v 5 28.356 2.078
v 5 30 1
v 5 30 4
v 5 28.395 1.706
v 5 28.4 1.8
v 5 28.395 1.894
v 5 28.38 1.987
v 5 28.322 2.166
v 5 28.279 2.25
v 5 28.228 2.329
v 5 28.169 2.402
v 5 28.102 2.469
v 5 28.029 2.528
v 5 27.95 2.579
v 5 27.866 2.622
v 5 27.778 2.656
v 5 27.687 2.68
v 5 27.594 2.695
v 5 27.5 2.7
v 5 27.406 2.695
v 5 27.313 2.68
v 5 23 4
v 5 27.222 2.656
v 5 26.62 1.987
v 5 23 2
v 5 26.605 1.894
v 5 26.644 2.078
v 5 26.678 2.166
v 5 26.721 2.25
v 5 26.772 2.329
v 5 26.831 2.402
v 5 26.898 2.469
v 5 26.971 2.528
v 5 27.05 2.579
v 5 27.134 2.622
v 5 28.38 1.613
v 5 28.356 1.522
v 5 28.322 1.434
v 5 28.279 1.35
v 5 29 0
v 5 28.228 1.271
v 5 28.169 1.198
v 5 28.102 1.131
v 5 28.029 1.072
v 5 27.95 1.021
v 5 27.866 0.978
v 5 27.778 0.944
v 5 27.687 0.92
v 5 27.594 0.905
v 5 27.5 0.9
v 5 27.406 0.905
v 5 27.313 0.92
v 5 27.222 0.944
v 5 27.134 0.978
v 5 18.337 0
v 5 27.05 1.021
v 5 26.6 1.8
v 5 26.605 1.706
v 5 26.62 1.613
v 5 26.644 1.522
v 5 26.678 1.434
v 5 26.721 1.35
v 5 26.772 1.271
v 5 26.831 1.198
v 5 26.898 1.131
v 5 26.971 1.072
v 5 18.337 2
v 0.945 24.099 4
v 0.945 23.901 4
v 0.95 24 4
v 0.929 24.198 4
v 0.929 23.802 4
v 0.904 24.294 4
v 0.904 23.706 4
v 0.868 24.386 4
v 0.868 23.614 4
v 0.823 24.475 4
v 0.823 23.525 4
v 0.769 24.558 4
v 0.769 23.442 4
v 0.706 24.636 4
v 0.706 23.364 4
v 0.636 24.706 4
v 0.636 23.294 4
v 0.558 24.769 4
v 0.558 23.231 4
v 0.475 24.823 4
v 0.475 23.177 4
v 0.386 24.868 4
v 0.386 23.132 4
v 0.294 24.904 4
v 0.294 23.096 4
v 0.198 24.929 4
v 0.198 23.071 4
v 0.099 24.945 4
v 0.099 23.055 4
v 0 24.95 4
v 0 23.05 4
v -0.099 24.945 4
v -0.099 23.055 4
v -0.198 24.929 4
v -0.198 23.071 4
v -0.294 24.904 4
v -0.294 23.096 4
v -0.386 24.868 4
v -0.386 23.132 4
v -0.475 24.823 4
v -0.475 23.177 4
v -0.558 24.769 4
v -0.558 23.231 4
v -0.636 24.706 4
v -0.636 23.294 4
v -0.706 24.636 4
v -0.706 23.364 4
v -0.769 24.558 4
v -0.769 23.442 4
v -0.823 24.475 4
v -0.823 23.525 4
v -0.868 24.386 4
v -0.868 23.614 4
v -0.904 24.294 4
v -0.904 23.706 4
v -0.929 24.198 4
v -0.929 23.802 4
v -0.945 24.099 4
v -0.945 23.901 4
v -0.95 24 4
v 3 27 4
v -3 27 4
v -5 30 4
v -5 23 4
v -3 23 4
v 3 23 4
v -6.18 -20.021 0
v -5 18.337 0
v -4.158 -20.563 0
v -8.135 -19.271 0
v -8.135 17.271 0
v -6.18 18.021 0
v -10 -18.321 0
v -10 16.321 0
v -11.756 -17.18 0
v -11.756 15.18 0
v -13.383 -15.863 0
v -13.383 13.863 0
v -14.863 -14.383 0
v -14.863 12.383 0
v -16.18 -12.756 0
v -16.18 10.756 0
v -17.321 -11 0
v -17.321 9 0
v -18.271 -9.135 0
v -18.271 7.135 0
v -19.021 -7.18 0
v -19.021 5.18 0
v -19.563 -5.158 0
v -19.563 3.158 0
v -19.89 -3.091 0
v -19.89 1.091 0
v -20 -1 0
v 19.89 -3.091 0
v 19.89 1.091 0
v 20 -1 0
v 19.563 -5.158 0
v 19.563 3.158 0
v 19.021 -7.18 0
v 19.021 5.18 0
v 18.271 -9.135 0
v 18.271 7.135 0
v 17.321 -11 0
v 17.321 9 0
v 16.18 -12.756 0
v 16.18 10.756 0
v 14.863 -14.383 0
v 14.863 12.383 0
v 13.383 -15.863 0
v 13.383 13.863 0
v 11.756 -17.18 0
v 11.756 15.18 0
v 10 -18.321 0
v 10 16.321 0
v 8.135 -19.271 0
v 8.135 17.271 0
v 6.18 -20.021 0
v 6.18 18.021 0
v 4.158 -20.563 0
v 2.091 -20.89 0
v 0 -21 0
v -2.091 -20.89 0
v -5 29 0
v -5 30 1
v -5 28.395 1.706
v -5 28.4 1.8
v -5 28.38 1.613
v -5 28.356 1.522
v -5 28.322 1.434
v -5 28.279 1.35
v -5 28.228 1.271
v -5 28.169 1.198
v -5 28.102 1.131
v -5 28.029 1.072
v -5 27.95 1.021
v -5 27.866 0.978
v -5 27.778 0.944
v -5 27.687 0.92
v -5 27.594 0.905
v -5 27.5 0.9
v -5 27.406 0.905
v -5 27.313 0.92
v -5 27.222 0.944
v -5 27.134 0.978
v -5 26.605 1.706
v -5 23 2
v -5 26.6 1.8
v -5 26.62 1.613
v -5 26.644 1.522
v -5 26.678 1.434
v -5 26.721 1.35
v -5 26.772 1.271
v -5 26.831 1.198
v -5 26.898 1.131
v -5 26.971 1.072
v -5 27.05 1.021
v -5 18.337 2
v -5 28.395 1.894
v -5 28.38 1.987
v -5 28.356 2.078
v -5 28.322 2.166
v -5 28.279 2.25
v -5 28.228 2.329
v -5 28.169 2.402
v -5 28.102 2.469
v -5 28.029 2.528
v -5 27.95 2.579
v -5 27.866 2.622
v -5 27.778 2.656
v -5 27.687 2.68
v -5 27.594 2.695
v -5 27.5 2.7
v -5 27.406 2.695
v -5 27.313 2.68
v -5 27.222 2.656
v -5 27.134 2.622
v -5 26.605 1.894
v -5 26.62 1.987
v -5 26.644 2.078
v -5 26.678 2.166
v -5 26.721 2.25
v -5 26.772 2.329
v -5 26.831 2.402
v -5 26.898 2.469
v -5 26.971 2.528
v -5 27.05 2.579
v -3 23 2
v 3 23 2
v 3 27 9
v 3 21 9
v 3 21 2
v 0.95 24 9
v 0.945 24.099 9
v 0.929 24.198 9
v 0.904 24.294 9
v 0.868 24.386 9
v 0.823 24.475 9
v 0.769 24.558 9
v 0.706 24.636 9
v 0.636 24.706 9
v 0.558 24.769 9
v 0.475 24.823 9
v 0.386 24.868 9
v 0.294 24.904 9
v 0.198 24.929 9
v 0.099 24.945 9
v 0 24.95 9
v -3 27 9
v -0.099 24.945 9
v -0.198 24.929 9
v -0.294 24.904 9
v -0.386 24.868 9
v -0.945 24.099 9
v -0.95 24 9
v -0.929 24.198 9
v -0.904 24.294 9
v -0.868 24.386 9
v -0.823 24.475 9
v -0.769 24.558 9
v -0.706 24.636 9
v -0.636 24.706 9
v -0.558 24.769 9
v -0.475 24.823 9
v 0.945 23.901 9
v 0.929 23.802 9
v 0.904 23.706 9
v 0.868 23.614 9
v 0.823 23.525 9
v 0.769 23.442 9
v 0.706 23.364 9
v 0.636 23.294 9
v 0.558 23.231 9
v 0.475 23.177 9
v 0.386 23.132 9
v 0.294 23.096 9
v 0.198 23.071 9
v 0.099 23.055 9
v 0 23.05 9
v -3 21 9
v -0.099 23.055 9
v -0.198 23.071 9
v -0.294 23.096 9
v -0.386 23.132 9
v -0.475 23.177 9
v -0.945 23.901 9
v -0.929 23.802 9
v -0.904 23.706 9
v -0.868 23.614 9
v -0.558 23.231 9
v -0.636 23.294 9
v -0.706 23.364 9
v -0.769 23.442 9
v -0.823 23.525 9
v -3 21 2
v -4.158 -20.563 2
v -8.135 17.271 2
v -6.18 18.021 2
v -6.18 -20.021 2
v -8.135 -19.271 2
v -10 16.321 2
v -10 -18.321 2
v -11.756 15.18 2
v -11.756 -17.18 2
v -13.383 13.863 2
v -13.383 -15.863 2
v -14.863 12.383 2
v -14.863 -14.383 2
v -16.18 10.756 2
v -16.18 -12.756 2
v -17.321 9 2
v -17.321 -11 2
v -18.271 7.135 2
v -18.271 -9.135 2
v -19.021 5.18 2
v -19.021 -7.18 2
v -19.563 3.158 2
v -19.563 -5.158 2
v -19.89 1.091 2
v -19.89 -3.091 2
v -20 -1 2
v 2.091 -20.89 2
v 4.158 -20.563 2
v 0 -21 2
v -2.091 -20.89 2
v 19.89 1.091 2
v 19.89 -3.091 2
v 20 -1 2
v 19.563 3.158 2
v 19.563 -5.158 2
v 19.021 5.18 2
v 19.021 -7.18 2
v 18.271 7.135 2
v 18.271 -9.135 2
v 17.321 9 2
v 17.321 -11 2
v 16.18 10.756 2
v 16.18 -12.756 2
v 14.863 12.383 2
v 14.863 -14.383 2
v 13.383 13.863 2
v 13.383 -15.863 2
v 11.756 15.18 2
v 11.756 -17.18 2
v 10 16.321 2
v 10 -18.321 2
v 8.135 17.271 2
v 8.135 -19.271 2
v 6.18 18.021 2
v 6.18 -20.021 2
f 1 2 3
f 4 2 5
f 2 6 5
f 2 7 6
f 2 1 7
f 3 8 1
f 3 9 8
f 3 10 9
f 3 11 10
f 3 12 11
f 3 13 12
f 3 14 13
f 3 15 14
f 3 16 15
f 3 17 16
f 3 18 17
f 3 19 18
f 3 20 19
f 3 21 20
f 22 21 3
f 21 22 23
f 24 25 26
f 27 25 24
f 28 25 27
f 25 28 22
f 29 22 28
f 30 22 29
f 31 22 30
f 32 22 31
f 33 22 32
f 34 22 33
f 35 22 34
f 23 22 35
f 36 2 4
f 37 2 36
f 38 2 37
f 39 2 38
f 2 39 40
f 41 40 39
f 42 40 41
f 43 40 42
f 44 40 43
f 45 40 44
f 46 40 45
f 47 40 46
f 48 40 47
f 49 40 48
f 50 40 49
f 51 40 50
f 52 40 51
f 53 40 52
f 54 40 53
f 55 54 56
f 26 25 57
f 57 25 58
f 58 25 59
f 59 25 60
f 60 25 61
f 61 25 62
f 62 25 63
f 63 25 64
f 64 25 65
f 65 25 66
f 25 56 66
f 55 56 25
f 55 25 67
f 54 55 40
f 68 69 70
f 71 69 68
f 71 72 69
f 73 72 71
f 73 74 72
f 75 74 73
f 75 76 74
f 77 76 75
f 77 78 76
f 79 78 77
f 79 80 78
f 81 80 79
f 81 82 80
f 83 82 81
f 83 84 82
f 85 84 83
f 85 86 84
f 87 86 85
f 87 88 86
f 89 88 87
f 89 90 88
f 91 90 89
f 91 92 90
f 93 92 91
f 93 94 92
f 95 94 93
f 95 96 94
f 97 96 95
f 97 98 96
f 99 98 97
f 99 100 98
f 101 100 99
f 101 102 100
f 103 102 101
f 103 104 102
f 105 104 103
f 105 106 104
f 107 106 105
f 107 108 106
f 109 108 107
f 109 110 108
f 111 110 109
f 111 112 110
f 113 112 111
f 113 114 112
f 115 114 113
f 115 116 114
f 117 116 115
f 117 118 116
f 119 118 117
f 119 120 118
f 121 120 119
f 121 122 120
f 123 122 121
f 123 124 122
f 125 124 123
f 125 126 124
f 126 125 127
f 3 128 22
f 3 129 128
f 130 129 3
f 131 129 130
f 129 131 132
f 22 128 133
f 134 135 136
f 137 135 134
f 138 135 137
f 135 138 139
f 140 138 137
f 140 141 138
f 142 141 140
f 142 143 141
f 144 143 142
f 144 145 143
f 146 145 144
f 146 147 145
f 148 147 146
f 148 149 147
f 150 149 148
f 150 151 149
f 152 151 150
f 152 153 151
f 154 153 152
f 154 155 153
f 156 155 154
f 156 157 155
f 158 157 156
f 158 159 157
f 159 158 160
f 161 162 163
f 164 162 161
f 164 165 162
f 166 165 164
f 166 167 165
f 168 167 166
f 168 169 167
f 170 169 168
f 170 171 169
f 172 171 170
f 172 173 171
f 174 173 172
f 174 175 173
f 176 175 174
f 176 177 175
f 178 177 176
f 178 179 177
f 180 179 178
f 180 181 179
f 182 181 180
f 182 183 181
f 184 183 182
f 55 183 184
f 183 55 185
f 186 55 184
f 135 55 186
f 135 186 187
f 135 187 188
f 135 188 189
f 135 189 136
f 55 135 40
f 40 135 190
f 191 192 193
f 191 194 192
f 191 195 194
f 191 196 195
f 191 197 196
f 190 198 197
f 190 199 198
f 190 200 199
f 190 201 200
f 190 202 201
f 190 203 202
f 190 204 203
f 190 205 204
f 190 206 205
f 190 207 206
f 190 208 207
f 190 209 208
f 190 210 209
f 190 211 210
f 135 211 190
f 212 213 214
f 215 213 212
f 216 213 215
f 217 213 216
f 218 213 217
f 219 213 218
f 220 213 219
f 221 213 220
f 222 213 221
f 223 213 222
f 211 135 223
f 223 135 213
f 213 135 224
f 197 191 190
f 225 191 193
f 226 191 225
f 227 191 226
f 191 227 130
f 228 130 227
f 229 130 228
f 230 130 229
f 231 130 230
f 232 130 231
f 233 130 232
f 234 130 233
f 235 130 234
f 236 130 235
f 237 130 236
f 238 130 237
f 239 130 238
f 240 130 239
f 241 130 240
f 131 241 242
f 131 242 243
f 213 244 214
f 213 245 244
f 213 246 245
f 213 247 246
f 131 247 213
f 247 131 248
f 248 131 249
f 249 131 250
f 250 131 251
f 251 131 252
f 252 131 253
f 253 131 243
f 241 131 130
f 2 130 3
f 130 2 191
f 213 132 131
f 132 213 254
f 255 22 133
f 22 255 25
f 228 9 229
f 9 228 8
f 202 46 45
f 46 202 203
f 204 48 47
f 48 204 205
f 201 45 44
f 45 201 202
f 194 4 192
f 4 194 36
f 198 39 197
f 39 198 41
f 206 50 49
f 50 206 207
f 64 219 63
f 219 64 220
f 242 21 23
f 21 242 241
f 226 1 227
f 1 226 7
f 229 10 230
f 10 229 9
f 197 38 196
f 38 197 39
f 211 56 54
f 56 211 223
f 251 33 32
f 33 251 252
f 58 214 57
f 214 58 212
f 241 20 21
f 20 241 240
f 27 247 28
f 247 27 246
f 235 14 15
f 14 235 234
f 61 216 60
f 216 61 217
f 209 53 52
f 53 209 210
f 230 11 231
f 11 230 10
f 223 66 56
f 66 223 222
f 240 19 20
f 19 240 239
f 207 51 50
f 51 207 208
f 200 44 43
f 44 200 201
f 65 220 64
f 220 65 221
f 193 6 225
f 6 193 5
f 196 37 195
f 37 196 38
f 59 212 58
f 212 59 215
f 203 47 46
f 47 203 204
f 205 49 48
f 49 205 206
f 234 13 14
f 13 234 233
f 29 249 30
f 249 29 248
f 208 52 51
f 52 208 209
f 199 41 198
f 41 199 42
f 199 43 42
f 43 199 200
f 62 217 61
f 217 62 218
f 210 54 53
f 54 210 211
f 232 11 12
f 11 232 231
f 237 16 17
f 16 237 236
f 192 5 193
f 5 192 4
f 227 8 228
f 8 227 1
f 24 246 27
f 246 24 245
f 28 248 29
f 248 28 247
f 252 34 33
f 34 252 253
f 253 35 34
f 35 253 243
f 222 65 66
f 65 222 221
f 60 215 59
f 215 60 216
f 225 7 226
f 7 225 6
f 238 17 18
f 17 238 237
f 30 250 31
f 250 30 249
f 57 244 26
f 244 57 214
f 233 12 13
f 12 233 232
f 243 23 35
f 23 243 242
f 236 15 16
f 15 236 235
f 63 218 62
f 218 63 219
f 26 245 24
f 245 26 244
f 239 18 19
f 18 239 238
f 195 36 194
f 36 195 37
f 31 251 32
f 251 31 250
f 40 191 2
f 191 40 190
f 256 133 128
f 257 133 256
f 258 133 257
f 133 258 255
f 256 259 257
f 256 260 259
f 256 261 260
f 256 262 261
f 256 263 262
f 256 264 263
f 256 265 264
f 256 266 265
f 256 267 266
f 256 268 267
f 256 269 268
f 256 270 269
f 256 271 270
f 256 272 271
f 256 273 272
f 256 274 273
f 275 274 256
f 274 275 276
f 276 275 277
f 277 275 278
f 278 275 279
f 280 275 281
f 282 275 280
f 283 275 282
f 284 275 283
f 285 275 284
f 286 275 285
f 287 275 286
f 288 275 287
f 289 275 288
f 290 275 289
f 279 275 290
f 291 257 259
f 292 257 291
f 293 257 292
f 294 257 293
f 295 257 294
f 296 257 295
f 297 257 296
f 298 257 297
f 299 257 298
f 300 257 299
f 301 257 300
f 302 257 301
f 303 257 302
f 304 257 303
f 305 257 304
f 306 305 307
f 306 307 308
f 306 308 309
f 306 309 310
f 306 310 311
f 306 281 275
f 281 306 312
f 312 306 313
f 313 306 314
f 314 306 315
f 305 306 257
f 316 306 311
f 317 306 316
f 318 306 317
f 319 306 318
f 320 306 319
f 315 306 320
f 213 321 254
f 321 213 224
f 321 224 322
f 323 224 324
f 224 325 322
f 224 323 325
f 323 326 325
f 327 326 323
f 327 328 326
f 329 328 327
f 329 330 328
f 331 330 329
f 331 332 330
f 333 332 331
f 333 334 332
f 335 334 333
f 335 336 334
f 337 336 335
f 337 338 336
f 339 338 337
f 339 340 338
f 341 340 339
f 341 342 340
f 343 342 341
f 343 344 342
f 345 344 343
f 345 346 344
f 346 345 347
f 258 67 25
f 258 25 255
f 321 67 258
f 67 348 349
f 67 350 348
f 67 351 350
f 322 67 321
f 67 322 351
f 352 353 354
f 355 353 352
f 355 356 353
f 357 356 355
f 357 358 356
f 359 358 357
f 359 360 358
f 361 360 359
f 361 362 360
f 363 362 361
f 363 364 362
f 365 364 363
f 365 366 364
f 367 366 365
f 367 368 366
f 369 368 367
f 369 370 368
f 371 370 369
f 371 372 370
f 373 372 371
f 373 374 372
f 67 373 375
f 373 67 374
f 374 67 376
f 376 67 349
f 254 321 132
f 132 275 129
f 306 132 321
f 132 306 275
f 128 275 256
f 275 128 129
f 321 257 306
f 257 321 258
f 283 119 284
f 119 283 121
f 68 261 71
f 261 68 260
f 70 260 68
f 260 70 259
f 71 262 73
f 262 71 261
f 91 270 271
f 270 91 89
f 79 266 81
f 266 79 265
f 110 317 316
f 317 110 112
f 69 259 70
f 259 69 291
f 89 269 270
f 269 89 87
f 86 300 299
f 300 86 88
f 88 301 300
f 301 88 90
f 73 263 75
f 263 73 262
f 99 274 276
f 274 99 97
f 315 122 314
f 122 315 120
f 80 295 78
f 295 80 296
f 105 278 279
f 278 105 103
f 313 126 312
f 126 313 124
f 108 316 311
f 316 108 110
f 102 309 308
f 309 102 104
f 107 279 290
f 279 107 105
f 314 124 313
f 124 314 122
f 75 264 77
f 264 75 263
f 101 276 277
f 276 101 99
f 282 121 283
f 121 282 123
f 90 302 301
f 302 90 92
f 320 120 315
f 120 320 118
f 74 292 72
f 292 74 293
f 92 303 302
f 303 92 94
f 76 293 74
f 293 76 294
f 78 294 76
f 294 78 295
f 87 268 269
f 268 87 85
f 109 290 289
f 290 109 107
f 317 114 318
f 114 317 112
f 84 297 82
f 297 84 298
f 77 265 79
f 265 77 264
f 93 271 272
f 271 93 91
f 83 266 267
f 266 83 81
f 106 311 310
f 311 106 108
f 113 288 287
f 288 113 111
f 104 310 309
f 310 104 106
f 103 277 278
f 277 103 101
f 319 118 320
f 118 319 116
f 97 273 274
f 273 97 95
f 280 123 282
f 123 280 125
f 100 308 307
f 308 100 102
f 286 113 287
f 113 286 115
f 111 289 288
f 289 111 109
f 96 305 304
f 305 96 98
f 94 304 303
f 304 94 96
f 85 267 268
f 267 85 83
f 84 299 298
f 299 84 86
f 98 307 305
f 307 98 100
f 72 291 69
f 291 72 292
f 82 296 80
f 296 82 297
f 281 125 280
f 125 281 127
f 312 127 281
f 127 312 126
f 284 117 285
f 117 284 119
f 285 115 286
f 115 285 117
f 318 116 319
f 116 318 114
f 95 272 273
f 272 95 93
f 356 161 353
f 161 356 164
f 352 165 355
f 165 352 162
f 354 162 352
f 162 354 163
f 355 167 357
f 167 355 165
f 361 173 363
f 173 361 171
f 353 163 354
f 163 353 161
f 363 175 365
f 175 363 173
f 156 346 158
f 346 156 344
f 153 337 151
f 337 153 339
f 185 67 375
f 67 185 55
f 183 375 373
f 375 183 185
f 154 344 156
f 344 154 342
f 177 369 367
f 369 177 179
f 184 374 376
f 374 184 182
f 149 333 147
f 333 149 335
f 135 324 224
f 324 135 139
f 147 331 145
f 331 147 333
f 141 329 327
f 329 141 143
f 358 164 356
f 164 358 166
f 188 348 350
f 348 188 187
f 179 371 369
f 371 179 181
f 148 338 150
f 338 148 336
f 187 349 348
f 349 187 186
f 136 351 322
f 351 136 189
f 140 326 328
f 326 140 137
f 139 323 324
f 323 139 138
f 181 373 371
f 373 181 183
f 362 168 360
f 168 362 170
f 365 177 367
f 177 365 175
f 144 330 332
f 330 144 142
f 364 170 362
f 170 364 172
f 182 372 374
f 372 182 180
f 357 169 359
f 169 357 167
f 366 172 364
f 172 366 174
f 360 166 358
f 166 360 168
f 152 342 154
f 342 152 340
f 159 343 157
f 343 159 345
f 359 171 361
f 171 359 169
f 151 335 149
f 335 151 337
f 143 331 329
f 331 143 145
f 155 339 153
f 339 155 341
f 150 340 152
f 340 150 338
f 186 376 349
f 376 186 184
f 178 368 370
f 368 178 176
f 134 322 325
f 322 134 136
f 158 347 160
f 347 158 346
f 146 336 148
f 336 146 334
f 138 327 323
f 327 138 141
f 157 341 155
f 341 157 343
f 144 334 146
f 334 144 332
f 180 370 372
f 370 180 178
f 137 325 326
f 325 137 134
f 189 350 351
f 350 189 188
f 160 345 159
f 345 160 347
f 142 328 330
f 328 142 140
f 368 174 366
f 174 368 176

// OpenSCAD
$fn=60;

translate([0,-1,0])cylinder (d=40,h=2);
translate([-5,0,0]) cube([10,25,2]);
difference() //cardine
	{
	translate([-5,23,0]) cube([10,7,4]); 
	translate([-6,27.5,1.8]) rotate([0,90,0]) cylinder(d=1.8,h=12);
	translate([-6,30,0]) rotate([0,90,0]) cylinder(d=2,h=12,$fn=4);
	}

difference() //reggimolla
	{
	translate([-3,21,2]) cube([6,6,7]);
	translate([0,24,4]) cylinder(d=1.9,h=7);
	translate([-6,27.5,1.8]) rotate([0,90,0]) cylinder(d=1.8,h=12);
	}
	
//hull()
//	{
//	translate([-1,10,9]) cube([2,3,1]);//punta
//	translate([-1.5,-15,0]) cube([3,30,1]);//base
//	}
